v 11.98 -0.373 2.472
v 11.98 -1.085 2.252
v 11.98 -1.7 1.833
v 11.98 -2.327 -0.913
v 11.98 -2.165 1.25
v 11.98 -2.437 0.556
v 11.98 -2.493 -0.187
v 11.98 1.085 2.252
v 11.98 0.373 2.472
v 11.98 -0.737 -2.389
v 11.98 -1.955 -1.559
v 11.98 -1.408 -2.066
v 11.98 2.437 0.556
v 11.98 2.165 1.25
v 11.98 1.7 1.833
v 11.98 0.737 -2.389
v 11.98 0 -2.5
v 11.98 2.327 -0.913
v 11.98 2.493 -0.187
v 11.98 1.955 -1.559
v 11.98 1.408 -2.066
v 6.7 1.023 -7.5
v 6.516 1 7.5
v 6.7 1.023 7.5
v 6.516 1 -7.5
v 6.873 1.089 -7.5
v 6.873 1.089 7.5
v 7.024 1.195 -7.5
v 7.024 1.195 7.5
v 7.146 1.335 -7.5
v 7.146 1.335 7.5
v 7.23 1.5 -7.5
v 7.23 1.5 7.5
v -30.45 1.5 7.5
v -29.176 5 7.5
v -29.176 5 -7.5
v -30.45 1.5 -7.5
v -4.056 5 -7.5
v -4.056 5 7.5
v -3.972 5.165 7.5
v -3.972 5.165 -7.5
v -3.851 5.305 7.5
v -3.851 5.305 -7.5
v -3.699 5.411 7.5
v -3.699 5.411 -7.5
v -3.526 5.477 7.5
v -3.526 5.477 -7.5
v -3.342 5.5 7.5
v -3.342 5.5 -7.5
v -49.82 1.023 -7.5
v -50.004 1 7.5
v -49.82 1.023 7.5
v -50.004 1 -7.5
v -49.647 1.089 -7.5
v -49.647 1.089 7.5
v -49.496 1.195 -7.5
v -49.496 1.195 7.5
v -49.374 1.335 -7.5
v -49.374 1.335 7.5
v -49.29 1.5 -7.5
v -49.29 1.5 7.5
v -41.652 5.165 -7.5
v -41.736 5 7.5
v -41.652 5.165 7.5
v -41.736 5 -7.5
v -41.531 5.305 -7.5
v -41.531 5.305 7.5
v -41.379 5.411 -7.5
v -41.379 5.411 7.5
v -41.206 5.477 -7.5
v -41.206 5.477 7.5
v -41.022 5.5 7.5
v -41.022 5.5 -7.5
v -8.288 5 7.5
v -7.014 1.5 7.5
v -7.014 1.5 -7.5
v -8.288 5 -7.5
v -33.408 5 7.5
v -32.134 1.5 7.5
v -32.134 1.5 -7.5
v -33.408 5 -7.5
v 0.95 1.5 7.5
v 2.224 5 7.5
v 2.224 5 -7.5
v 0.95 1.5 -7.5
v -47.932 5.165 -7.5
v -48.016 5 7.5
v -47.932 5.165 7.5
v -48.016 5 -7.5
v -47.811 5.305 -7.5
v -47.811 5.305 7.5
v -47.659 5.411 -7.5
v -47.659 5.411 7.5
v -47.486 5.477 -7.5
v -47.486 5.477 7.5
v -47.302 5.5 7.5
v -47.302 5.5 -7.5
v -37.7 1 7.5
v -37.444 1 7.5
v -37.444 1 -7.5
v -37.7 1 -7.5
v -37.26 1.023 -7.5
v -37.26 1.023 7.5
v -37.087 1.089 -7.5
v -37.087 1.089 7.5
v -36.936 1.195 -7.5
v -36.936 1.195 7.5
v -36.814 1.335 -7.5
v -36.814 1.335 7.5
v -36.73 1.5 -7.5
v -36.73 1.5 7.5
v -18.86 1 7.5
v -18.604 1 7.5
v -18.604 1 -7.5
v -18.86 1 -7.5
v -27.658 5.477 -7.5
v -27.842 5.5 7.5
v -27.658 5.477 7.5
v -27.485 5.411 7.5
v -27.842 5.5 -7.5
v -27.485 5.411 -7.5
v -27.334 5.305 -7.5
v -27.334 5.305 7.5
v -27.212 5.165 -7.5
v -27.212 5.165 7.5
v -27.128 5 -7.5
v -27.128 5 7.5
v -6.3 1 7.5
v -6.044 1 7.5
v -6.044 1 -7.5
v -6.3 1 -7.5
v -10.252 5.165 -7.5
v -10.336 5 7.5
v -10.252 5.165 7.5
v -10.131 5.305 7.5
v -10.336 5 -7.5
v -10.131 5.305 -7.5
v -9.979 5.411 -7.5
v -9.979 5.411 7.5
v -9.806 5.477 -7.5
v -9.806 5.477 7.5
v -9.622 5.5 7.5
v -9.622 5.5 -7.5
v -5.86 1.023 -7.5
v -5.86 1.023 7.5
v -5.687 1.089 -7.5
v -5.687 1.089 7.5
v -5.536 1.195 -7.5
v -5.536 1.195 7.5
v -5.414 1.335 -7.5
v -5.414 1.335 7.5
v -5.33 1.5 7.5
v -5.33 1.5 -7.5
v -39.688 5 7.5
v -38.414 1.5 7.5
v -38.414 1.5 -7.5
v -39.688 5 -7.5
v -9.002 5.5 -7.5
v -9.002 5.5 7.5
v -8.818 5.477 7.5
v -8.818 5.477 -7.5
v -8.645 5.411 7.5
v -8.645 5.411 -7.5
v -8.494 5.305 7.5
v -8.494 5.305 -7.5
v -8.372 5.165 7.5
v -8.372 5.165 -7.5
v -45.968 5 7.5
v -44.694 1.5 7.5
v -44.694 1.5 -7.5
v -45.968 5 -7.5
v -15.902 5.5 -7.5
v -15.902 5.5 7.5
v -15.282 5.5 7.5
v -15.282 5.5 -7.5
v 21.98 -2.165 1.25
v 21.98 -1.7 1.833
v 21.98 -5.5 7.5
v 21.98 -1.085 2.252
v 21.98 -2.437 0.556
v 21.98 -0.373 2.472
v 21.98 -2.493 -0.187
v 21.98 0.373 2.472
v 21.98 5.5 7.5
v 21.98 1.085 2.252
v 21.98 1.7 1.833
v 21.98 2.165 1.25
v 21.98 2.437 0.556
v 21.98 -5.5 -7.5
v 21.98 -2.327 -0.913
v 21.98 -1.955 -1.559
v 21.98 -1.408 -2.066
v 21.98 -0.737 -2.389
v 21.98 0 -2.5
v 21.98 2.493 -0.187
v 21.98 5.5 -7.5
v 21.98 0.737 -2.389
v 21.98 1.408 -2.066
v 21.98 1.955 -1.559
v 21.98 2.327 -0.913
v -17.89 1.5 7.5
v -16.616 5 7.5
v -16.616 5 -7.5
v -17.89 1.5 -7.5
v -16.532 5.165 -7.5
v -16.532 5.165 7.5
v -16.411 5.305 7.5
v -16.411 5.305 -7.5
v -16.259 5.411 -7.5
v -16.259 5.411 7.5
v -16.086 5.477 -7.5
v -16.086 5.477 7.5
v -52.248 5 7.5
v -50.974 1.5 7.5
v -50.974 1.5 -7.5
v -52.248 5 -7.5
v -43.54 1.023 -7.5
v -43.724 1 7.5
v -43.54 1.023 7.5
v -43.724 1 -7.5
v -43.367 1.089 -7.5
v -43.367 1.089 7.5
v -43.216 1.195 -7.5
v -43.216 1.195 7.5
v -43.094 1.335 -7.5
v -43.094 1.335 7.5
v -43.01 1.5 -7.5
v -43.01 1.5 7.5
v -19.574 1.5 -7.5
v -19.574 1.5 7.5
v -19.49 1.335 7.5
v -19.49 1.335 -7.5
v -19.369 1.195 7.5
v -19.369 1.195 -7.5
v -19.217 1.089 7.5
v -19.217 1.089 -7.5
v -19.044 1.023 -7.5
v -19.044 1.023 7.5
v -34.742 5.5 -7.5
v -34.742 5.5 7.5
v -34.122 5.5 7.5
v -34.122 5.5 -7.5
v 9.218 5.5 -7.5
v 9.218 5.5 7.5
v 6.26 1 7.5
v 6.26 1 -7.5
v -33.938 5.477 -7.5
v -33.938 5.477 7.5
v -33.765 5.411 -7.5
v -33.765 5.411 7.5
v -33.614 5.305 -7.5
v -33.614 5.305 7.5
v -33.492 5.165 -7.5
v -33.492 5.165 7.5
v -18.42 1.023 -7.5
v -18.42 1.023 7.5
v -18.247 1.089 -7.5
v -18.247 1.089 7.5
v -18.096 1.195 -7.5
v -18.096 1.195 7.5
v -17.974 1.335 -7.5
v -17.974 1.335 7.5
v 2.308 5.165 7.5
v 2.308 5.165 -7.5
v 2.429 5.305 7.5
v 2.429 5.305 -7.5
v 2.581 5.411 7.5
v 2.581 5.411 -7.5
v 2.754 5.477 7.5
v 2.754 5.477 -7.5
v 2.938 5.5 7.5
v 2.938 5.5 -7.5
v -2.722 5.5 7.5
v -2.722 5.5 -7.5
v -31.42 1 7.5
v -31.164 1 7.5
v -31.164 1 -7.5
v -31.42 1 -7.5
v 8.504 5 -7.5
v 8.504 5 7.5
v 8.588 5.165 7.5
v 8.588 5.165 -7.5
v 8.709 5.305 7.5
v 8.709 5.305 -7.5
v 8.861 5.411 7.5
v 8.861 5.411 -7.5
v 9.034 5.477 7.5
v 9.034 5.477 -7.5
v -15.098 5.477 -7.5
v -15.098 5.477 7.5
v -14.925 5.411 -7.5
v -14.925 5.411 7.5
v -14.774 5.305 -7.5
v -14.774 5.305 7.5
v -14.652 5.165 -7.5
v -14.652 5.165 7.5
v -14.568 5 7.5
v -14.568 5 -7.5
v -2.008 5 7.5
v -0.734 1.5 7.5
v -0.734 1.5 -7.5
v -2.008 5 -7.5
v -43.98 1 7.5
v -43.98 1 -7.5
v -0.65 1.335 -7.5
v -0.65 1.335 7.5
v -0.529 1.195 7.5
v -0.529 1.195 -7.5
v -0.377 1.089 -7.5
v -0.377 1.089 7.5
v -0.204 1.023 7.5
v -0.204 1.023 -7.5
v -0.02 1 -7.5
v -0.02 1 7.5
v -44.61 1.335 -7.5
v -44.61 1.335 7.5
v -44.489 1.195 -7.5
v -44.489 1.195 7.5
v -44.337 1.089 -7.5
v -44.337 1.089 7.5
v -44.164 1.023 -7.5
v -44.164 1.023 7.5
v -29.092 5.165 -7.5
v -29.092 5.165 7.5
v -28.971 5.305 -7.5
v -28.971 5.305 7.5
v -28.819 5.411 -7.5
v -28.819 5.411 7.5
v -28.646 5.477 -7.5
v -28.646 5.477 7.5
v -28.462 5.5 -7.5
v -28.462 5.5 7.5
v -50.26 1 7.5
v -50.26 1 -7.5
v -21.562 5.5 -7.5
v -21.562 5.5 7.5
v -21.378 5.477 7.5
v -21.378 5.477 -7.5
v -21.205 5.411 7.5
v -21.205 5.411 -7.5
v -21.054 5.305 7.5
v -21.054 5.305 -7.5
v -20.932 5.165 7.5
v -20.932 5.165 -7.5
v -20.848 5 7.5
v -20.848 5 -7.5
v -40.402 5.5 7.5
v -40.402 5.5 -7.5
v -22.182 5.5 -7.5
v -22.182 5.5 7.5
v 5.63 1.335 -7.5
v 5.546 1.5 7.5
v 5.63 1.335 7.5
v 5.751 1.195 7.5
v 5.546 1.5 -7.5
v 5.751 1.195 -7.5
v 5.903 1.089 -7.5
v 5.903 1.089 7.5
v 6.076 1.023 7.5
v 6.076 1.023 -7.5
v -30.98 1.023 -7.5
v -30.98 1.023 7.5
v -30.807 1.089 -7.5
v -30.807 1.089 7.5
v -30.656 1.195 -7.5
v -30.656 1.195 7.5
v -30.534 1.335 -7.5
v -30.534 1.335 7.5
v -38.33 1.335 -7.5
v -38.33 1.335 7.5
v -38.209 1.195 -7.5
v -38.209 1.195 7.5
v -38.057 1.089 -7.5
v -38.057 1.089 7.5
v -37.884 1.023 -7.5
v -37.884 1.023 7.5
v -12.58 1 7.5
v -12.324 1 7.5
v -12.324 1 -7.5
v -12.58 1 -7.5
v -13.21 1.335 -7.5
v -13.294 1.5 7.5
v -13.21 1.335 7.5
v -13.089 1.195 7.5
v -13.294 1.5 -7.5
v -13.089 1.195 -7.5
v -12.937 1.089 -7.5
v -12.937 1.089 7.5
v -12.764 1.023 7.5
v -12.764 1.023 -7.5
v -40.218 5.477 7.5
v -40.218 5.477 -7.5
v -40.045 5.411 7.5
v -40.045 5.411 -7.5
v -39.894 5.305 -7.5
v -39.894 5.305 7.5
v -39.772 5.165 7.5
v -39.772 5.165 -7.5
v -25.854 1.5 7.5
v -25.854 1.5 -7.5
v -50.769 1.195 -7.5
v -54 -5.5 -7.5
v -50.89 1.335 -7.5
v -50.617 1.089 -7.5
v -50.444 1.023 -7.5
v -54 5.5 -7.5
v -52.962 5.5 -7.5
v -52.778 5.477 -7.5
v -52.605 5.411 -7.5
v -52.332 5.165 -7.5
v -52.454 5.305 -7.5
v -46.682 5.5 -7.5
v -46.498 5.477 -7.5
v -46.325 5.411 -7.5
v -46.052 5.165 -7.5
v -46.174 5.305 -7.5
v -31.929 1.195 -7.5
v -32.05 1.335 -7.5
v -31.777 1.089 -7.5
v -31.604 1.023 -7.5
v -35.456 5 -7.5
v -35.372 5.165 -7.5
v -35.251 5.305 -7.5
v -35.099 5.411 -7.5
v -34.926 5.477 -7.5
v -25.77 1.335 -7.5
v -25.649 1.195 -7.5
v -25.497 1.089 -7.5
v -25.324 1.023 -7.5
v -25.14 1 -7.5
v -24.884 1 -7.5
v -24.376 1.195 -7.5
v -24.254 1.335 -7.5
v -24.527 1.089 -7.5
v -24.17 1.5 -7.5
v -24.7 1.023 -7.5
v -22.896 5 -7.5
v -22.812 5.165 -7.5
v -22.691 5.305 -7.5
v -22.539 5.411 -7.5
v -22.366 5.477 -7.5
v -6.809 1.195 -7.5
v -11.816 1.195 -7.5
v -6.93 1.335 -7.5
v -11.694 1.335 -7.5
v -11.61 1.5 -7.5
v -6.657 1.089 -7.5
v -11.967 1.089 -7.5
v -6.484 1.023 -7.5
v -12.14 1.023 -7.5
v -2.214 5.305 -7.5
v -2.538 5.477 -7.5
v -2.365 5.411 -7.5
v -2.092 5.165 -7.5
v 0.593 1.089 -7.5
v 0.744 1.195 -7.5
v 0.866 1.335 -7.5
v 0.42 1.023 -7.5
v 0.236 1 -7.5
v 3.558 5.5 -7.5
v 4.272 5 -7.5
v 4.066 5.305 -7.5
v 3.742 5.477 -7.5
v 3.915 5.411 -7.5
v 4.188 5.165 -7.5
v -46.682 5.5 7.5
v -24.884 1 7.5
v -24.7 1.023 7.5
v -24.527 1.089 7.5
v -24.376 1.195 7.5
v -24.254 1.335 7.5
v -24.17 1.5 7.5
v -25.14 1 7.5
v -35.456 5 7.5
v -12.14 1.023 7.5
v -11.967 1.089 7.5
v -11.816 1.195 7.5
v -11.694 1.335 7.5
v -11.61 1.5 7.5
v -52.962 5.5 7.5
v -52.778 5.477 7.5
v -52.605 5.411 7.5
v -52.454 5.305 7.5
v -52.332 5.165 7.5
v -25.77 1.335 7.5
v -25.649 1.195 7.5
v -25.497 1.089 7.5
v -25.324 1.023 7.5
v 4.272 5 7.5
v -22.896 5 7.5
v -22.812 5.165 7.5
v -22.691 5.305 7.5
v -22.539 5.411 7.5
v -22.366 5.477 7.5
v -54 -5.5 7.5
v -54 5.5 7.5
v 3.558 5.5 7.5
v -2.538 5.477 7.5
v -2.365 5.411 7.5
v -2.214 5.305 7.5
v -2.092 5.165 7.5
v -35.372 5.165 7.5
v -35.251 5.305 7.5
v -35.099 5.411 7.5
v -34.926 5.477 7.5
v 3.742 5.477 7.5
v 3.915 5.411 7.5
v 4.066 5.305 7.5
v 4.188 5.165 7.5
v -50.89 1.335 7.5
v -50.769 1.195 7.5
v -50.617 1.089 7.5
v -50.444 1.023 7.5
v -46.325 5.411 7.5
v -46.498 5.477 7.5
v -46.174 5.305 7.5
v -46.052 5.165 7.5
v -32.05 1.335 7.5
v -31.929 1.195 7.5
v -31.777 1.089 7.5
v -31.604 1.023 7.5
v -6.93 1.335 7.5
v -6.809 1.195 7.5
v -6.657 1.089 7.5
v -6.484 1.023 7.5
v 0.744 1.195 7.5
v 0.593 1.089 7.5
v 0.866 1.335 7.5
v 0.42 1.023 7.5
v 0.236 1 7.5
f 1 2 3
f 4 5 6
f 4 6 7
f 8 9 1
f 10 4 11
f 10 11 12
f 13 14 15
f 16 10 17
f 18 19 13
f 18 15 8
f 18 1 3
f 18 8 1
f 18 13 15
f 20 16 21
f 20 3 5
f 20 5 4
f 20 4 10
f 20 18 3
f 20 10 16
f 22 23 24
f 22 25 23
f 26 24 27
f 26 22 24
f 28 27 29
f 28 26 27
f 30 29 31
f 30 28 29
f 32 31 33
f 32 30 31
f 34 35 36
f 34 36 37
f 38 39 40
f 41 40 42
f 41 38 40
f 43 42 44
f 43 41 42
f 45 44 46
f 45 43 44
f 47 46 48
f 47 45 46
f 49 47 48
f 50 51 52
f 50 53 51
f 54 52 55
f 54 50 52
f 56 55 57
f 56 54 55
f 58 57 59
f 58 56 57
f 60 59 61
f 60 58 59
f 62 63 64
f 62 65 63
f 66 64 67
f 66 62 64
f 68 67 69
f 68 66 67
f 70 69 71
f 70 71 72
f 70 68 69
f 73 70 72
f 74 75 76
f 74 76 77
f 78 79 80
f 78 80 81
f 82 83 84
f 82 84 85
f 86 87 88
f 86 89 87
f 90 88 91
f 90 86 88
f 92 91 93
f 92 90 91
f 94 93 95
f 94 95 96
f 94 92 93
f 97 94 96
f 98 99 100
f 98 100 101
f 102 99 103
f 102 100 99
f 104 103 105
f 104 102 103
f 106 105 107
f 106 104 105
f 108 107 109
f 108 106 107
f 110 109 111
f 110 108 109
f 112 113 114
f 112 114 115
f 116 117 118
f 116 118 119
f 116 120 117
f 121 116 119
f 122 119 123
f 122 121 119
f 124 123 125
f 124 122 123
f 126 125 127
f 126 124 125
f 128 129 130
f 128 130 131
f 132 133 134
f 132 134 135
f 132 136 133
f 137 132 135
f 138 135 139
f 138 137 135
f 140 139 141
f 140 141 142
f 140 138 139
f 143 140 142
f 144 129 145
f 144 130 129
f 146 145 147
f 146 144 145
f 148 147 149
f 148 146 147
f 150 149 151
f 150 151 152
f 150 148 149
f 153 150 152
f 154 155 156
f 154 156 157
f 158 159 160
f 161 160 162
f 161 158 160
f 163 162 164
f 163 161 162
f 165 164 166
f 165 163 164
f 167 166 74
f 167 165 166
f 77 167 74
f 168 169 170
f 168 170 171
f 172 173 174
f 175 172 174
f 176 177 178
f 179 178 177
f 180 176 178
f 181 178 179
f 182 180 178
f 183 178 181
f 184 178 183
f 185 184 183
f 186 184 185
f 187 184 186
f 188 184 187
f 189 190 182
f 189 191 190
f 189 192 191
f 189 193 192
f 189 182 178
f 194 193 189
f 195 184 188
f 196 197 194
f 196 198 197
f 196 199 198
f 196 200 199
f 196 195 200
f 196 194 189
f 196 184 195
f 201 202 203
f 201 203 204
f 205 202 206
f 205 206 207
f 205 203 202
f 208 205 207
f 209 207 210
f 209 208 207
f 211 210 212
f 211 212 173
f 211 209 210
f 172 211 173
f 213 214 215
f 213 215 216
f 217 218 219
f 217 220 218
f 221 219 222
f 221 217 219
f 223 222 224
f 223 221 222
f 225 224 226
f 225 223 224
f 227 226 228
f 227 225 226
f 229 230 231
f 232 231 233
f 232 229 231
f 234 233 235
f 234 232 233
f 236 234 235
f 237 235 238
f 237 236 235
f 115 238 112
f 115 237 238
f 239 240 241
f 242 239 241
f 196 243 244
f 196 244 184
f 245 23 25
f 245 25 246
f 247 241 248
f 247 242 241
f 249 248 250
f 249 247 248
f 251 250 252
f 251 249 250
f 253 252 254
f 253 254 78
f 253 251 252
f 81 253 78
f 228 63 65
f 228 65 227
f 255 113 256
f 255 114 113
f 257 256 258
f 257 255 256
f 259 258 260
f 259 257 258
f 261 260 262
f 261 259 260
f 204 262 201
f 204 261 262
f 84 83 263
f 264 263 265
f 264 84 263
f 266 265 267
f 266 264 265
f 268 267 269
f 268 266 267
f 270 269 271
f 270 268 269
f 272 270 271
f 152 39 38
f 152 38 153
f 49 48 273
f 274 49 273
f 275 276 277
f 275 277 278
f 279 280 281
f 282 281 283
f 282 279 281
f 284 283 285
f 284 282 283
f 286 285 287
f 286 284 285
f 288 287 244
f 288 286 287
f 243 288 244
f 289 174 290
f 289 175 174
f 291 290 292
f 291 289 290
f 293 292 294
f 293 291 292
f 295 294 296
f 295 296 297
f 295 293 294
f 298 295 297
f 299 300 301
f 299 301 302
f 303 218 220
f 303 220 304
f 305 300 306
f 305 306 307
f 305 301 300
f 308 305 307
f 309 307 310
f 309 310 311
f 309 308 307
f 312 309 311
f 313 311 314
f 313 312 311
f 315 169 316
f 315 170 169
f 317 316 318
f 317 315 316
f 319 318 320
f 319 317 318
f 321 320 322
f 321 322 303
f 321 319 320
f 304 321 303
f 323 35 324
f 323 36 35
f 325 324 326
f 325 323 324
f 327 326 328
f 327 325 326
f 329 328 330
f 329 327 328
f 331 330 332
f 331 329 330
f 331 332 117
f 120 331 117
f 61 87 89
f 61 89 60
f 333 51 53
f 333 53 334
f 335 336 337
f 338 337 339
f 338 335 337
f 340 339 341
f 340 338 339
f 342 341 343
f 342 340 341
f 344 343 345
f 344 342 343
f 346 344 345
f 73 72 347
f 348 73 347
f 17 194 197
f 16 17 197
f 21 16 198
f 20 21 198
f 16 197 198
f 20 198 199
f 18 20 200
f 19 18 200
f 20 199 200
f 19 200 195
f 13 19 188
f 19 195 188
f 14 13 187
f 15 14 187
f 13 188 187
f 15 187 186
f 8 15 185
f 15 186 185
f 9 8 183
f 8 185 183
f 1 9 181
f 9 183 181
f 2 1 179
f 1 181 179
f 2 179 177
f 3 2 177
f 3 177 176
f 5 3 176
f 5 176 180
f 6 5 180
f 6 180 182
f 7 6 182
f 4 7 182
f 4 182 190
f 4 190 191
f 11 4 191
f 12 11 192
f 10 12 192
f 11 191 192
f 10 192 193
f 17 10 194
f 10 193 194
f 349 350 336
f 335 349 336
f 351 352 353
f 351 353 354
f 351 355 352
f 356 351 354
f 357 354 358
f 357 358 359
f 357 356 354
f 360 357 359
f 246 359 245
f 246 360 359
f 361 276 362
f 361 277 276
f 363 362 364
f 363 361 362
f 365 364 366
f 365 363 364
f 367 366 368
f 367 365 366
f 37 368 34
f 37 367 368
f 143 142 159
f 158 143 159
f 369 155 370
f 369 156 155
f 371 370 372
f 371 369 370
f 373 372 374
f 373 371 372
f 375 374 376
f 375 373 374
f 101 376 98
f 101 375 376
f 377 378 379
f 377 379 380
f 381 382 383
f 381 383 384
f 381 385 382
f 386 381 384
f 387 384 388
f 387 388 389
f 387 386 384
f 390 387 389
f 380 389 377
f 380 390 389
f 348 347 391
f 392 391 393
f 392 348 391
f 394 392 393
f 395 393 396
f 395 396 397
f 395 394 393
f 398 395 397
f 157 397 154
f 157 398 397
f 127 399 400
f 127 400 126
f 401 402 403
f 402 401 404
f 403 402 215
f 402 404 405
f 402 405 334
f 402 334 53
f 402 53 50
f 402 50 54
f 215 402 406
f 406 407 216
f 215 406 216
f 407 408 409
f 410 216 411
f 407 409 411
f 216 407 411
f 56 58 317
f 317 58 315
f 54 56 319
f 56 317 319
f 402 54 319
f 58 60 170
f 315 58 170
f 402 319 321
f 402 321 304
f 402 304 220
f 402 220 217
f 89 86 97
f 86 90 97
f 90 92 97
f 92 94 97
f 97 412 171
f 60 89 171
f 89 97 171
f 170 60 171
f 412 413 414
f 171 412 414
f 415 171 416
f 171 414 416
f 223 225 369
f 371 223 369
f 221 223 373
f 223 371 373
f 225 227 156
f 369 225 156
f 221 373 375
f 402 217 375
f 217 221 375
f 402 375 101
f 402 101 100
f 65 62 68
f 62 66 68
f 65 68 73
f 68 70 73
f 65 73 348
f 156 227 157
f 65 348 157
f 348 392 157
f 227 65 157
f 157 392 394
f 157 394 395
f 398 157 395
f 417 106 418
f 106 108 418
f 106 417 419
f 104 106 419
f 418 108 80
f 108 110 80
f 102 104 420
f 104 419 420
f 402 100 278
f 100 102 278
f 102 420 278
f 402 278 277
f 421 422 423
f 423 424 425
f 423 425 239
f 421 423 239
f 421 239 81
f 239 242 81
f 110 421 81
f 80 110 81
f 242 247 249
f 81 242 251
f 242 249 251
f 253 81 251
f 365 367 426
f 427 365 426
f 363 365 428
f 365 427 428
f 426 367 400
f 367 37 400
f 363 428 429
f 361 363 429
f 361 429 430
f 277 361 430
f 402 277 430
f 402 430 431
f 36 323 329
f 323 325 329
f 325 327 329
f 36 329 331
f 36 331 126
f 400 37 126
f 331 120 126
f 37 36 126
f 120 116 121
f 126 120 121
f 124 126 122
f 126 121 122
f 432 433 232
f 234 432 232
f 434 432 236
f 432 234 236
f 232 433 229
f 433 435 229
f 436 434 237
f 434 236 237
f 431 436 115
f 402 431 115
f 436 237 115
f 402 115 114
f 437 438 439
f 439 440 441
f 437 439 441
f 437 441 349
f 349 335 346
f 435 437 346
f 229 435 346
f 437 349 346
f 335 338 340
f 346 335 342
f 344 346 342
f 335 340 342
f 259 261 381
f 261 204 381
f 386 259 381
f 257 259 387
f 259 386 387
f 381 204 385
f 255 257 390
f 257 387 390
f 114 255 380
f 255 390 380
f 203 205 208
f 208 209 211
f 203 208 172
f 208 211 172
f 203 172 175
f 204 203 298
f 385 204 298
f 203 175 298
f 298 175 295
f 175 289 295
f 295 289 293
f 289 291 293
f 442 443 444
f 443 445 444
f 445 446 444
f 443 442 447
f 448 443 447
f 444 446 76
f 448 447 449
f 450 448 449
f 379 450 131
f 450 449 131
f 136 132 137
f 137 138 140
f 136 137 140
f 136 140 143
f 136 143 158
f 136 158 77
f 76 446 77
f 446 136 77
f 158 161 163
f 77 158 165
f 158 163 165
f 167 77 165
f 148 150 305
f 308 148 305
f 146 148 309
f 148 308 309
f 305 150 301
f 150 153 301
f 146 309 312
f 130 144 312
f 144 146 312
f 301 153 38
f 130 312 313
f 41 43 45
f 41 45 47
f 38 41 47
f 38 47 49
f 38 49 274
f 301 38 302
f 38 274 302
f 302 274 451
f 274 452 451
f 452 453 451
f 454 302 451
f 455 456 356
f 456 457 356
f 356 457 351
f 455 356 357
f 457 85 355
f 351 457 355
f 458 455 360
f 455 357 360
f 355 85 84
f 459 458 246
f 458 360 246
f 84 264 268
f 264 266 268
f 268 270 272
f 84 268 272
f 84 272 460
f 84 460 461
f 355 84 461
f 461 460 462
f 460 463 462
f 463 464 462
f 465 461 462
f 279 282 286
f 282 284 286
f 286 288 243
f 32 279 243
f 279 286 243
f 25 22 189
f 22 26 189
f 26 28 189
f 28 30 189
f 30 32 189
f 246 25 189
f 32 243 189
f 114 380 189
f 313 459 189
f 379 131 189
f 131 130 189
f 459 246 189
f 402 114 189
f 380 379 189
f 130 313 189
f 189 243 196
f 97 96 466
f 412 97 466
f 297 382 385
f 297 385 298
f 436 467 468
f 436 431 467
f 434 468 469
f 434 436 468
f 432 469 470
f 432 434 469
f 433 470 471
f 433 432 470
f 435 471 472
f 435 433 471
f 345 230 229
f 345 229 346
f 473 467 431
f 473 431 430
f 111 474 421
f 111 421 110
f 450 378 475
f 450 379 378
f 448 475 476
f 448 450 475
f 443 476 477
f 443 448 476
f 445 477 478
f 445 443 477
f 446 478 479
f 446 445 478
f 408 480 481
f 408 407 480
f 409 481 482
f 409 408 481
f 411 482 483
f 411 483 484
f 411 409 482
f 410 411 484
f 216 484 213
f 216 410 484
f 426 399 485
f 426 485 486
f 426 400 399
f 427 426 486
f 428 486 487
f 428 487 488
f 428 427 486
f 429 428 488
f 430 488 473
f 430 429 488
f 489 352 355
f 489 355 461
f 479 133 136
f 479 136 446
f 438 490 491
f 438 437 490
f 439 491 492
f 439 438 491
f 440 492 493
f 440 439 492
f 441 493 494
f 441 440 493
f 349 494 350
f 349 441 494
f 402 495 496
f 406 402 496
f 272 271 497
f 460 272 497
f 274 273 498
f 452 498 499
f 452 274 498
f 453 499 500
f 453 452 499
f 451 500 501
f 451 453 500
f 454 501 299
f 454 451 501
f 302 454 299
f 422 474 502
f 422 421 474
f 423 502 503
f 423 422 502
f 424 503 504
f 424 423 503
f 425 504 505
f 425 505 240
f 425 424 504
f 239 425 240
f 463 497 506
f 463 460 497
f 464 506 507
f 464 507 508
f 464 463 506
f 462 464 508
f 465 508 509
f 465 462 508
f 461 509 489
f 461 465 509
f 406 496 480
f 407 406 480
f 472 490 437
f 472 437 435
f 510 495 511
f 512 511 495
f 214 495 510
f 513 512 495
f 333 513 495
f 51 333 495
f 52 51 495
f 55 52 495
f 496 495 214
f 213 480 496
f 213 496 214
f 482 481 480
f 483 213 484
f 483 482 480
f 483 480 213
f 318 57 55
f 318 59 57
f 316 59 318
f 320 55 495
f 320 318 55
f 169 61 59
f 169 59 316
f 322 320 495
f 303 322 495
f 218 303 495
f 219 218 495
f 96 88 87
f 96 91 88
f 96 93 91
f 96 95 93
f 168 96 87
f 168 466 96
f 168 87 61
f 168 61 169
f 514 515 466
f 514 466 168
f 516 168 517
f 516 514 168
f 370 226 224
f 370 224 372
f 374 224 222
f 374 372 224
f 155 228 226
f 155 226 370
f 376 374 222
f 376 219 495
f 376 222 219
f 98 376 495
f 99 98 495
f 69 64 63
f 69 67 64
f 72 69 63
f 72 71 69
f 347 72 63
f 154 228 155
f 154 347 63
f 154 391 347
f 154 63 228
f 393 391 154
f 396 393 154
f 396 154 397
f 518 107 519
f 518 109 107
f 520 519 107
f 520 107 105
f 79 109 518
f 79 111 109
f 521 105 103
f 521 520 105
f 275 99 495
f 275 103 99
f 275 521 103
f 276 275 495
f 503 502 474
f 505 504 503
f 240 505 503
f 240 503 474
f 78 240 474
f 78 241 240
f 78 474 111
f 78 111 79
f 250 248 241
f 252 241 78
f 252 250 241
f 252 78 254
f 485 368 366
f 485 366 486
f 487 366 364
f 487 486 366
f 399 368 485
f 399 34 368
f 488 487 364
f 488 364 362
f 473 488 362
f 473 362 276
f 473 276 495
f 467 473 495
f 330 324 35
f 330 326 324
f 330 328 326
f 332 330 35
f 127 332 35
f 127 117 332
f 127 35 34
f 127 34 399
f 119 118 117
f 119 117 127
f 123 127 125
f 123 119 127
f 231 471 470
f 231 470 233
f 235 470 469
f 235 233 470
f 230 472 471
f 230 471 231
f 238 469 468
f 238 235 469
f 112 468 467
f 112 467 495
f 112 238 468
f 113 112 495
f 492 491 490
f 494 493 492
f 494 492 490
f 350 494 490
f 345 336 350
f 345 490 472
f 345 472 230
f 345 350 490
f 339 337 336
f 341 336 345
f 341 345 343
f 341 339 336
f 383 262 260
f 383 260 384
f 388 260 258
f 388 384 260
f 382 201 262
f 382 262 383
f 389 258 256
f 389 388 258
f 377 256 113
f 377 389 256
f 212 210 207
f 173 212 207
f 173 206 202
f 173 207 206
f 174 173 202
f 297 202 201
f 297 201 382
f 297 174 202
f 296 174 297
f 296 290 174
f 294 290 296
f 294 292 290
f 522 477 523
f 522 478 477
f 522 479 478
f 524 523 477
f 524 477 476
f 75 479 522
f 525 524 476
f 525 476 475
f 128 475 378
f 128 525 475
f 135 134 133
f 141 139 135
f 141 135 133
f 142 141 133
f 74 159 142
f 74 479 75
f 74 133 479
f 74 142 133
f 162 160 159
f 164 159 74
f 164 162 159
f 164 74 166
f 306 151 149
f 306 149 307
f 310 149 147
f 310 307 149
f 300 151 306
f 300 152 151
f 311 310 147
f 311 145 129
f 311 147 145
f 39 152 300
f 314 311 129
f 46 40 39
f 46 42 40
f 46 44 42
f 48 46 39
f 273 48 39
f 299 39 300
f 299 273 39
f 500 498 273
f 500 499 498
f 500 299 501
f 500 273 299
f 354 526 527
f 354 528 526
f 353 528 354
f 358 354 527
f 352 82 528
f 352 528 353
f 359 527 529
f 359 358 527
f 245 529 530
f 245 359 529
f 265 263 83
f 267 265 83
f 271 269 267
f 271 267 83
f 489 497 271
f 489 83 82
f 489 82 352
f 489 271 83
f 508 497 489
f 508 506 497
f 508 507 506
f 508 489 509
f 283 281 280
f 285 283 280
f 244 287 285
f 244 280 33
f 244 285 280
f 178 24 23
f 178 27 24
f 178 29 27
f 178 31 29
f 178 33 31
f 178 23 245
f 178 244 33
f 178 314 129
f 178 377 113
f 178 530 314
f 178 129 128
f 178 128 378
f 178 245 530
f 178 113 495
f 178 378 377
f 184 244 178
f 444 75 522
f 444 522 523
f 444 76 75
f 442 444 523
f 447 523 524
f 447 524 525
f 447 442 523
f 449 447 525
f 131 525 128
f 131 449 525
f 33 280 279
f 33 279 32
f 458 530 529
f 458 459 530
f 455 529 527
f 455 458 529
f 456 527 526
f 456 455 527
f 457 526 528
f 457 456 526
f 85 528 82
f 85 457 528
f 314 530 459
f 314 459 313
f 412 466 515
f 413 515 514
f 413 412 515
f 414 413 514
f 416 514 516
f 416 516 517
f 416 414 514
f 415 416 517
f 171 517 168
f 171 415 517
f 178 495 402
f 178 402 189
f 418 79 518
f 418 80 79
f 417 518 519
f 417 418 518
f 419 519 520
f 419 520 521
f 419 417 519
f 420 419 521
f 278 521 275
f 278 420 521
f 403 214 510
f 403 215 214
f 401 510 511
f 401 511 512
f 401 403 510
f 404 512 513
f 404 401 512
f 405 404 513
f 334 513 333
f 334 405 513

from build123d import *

# Parameters (mm, degrees)
SKETCH_1_W                     = 108
SKETCH_1_H                     = 11
EXTRUDE_1_DEPTH                = 7.5
CUT_EXTRUDE_1_DEPTH            = 16
FILLET_1_R                     = 0.76
PATTERN_LINEAR_1_COUNT         = 17
PATTERN_LINEAR_1_PITCH         = 6.28
FILLET_1_OF_PATTERN_LINEAR_1_R = 0.76
SKETCH_3_W                     = 15
SKETCH_3_H                     = 11
EXTRUDE_2_DEPTH                = 44.58
SKETCH_4_W                     = 15
SKETCH_4_H                     = 11
CUT_EXTRUDE_2_DEPTH            = 33.02
SKETCH_5_R                     = 2.5
CUT_EXTRUDE_3_DEPTH            = 10


with BuildPart() as part:
    # 草图1 → 凸台-拉伸1 (new body, symmetric)
    with BuildSketch(Plane.XY):
        Rectangle(SKETCH_1_W, SKETCH_1_H)
    extrude(amount=EXTRUDE_1_DEPTH, both=True)

    # 草图2 → 切除-拉伸1 (cut, through all)
    with BuildSketch(Plane.XY.offset(7.5)):
        Polygon((-52.43, 5.5), (-47.834119063, 5.5), (-49.471985117, 1), (-50.792133946, 1), align=None)
    cut_extrude_1 = extrude(amount=-CUT_EXTRUDE_1_DEPTH, mode=Mode.SUBTRACT)

    # 圆角1
    fillet_1_edges = [part.edges().sort_by_distance(p)[0] for p in [
        (-50.792133946, 1, 0),
        (-52.43, 5.5, 0),
        (-47.834119063, 5.5, 0),
        (-49.471985117, 1, 0),
    ]]
    fillet(fillet_1_edges, radius=FILLET_1_R)

    # 阵列(线性)1: 切除-拉伸1 ×17
    with Locations(*[(i * PATTERN_LINEAR_1_PITCH, 0, 0) for i in range(1, PATTERN_LINEAR_1_COUNT)]):
        add(cut_extrude_1, mode=Mode.SUBTRACT)

    # 圆角1 of 阵列(线性)1
    fillet_1_of_pattern_linear_1_edges = [part.edges().sort_by_distance(p)[0] for p in [
        (-44.512133946, 1, 0),
        (-46.15, 5.5, 0),
        (-41.554119063, 5.5, 0),
        (-43.191985117, 1, 0),
        (-38.232133946, 1, 0),
        (-39.87, 5.5, 0),
        (-35.274119063, 5.5, 0),
        (-36.911985117, 1, 0),
        (-31.952133946, 1, 0),
        (-33.59, 5.5, 0),
        (-28.994119063, 5.5, 0),
        (-30.631985117, 1, 0),
        (-25.672133946, 1, 0),
        (-27.31, 5.5, 0),
        (-22.714119063, 5.5, 0),
        (-24.351985117, 1, 0),
        (-19.392133946, 1, 0),
        (-21.03, 5.5, 0),
        (-16.434119063, 5.5, 0),
        (-18.071985117, 1, 0),
        (-13.112133946, 1, 0),
        (-14.75, 5.5, 0),
        (-10.154119063, 5.5, 0),
        (-11.791985117, 1, 0),
        (-6.832133946, 1, 0),
        (-8.47, 5.5, 0),
        (-3.874119063, 5.5, 0),
        (-5.511985117, 1, 0),
        (-0.552133946, 1, 0),
        (-2.19, 5.5, 0),
        (2.405880937, 5.5, 0),
        (0.768014883, 1, 0),
        (5.727866054, 1, 0),
        (4.09, 5.5, 0),
        (8.685880937, 5.5, 0),
        (7.048014883, 1, 0),
        (12.007866054, 1, 0),
        (10.37, 5.5, 0),
        (14.965880937, 5.5, 0),
        (13.328014883, 1, 0),
        (18.287866054, 1, 0),
        (16.65, 5.5, 0),
        (21.245880937, 5.5, 0),
        (19.608014883, 1, 0),
        (24.567866054, 1, 0),
        (22.93, 5.5, 0),
        (27.525880937, 5.5, 0),
        (25.888014883, 1, 0),
        (30.847866054, 1, 0),
        (29.21, 5.5, 0),
        (33.805880937, 5.5, 0),
        (32.168014883, 1, 0),
        (37.127866054, 1, 0),
        (35.49, 5.5, 0),
        (40.085880937, 5.5, 0),
        (38.448014883, 1, 0),
        (43.407866054, 1, 0),
        (41.77, 5.5, 0),
        (46.365880937, 5.5, 0),
        (44.728014883, 1, 0),
        (49.687866054, 1, 0),
        (48.05, 5.5, 0),
        (52.645880937, 5.5, 0),
        (51.008014883, 1, 0),
    ]]
    fillet(fillet_1_of_pattern_linear_1_edges, radius=FILLET_1_OF_PATTERN_LINEAR_1_R)

    # 草图3 → 凸台-拉伸2 (add)
    with BuildSketch(Plane(origin=(9.42, 0, 0), x_dir=(0, 0, -1), z_dir=(1, 0, 0))):
        Rectangle(SKETCH_3_W, SKETCH_3_H)
    extrude(amount=EXTRUDE_2_DEPTH)

    # 草图4 → 切除-拉伸2 (cut, through all)
    with BuildSketch(Plane(origin=(21.98, 0, 0), x_dir=(0, 0, -1), z_dir=(1, 0, 0))):
        Rectangle(SKETCH_4_W, SKETCH_4_H)
    extrude(amount=CUT_EXTRUDE_2_DEPTH, mode=Mode.SUBTRACT)

    # 草图5 → 切除-拉伸3 (cut)
    with BuildSketch(Plane(origin=(21.98, 0, 0), x_dir=(0, 0, -1), z_dir=(1, 0, 0))):
        Circle(SKETCH_5_R)
    extrude(amount=-CUT_EXTRUDE_3_DEPTH, mode=Mode.SUBTRACT)


solid = part.part
